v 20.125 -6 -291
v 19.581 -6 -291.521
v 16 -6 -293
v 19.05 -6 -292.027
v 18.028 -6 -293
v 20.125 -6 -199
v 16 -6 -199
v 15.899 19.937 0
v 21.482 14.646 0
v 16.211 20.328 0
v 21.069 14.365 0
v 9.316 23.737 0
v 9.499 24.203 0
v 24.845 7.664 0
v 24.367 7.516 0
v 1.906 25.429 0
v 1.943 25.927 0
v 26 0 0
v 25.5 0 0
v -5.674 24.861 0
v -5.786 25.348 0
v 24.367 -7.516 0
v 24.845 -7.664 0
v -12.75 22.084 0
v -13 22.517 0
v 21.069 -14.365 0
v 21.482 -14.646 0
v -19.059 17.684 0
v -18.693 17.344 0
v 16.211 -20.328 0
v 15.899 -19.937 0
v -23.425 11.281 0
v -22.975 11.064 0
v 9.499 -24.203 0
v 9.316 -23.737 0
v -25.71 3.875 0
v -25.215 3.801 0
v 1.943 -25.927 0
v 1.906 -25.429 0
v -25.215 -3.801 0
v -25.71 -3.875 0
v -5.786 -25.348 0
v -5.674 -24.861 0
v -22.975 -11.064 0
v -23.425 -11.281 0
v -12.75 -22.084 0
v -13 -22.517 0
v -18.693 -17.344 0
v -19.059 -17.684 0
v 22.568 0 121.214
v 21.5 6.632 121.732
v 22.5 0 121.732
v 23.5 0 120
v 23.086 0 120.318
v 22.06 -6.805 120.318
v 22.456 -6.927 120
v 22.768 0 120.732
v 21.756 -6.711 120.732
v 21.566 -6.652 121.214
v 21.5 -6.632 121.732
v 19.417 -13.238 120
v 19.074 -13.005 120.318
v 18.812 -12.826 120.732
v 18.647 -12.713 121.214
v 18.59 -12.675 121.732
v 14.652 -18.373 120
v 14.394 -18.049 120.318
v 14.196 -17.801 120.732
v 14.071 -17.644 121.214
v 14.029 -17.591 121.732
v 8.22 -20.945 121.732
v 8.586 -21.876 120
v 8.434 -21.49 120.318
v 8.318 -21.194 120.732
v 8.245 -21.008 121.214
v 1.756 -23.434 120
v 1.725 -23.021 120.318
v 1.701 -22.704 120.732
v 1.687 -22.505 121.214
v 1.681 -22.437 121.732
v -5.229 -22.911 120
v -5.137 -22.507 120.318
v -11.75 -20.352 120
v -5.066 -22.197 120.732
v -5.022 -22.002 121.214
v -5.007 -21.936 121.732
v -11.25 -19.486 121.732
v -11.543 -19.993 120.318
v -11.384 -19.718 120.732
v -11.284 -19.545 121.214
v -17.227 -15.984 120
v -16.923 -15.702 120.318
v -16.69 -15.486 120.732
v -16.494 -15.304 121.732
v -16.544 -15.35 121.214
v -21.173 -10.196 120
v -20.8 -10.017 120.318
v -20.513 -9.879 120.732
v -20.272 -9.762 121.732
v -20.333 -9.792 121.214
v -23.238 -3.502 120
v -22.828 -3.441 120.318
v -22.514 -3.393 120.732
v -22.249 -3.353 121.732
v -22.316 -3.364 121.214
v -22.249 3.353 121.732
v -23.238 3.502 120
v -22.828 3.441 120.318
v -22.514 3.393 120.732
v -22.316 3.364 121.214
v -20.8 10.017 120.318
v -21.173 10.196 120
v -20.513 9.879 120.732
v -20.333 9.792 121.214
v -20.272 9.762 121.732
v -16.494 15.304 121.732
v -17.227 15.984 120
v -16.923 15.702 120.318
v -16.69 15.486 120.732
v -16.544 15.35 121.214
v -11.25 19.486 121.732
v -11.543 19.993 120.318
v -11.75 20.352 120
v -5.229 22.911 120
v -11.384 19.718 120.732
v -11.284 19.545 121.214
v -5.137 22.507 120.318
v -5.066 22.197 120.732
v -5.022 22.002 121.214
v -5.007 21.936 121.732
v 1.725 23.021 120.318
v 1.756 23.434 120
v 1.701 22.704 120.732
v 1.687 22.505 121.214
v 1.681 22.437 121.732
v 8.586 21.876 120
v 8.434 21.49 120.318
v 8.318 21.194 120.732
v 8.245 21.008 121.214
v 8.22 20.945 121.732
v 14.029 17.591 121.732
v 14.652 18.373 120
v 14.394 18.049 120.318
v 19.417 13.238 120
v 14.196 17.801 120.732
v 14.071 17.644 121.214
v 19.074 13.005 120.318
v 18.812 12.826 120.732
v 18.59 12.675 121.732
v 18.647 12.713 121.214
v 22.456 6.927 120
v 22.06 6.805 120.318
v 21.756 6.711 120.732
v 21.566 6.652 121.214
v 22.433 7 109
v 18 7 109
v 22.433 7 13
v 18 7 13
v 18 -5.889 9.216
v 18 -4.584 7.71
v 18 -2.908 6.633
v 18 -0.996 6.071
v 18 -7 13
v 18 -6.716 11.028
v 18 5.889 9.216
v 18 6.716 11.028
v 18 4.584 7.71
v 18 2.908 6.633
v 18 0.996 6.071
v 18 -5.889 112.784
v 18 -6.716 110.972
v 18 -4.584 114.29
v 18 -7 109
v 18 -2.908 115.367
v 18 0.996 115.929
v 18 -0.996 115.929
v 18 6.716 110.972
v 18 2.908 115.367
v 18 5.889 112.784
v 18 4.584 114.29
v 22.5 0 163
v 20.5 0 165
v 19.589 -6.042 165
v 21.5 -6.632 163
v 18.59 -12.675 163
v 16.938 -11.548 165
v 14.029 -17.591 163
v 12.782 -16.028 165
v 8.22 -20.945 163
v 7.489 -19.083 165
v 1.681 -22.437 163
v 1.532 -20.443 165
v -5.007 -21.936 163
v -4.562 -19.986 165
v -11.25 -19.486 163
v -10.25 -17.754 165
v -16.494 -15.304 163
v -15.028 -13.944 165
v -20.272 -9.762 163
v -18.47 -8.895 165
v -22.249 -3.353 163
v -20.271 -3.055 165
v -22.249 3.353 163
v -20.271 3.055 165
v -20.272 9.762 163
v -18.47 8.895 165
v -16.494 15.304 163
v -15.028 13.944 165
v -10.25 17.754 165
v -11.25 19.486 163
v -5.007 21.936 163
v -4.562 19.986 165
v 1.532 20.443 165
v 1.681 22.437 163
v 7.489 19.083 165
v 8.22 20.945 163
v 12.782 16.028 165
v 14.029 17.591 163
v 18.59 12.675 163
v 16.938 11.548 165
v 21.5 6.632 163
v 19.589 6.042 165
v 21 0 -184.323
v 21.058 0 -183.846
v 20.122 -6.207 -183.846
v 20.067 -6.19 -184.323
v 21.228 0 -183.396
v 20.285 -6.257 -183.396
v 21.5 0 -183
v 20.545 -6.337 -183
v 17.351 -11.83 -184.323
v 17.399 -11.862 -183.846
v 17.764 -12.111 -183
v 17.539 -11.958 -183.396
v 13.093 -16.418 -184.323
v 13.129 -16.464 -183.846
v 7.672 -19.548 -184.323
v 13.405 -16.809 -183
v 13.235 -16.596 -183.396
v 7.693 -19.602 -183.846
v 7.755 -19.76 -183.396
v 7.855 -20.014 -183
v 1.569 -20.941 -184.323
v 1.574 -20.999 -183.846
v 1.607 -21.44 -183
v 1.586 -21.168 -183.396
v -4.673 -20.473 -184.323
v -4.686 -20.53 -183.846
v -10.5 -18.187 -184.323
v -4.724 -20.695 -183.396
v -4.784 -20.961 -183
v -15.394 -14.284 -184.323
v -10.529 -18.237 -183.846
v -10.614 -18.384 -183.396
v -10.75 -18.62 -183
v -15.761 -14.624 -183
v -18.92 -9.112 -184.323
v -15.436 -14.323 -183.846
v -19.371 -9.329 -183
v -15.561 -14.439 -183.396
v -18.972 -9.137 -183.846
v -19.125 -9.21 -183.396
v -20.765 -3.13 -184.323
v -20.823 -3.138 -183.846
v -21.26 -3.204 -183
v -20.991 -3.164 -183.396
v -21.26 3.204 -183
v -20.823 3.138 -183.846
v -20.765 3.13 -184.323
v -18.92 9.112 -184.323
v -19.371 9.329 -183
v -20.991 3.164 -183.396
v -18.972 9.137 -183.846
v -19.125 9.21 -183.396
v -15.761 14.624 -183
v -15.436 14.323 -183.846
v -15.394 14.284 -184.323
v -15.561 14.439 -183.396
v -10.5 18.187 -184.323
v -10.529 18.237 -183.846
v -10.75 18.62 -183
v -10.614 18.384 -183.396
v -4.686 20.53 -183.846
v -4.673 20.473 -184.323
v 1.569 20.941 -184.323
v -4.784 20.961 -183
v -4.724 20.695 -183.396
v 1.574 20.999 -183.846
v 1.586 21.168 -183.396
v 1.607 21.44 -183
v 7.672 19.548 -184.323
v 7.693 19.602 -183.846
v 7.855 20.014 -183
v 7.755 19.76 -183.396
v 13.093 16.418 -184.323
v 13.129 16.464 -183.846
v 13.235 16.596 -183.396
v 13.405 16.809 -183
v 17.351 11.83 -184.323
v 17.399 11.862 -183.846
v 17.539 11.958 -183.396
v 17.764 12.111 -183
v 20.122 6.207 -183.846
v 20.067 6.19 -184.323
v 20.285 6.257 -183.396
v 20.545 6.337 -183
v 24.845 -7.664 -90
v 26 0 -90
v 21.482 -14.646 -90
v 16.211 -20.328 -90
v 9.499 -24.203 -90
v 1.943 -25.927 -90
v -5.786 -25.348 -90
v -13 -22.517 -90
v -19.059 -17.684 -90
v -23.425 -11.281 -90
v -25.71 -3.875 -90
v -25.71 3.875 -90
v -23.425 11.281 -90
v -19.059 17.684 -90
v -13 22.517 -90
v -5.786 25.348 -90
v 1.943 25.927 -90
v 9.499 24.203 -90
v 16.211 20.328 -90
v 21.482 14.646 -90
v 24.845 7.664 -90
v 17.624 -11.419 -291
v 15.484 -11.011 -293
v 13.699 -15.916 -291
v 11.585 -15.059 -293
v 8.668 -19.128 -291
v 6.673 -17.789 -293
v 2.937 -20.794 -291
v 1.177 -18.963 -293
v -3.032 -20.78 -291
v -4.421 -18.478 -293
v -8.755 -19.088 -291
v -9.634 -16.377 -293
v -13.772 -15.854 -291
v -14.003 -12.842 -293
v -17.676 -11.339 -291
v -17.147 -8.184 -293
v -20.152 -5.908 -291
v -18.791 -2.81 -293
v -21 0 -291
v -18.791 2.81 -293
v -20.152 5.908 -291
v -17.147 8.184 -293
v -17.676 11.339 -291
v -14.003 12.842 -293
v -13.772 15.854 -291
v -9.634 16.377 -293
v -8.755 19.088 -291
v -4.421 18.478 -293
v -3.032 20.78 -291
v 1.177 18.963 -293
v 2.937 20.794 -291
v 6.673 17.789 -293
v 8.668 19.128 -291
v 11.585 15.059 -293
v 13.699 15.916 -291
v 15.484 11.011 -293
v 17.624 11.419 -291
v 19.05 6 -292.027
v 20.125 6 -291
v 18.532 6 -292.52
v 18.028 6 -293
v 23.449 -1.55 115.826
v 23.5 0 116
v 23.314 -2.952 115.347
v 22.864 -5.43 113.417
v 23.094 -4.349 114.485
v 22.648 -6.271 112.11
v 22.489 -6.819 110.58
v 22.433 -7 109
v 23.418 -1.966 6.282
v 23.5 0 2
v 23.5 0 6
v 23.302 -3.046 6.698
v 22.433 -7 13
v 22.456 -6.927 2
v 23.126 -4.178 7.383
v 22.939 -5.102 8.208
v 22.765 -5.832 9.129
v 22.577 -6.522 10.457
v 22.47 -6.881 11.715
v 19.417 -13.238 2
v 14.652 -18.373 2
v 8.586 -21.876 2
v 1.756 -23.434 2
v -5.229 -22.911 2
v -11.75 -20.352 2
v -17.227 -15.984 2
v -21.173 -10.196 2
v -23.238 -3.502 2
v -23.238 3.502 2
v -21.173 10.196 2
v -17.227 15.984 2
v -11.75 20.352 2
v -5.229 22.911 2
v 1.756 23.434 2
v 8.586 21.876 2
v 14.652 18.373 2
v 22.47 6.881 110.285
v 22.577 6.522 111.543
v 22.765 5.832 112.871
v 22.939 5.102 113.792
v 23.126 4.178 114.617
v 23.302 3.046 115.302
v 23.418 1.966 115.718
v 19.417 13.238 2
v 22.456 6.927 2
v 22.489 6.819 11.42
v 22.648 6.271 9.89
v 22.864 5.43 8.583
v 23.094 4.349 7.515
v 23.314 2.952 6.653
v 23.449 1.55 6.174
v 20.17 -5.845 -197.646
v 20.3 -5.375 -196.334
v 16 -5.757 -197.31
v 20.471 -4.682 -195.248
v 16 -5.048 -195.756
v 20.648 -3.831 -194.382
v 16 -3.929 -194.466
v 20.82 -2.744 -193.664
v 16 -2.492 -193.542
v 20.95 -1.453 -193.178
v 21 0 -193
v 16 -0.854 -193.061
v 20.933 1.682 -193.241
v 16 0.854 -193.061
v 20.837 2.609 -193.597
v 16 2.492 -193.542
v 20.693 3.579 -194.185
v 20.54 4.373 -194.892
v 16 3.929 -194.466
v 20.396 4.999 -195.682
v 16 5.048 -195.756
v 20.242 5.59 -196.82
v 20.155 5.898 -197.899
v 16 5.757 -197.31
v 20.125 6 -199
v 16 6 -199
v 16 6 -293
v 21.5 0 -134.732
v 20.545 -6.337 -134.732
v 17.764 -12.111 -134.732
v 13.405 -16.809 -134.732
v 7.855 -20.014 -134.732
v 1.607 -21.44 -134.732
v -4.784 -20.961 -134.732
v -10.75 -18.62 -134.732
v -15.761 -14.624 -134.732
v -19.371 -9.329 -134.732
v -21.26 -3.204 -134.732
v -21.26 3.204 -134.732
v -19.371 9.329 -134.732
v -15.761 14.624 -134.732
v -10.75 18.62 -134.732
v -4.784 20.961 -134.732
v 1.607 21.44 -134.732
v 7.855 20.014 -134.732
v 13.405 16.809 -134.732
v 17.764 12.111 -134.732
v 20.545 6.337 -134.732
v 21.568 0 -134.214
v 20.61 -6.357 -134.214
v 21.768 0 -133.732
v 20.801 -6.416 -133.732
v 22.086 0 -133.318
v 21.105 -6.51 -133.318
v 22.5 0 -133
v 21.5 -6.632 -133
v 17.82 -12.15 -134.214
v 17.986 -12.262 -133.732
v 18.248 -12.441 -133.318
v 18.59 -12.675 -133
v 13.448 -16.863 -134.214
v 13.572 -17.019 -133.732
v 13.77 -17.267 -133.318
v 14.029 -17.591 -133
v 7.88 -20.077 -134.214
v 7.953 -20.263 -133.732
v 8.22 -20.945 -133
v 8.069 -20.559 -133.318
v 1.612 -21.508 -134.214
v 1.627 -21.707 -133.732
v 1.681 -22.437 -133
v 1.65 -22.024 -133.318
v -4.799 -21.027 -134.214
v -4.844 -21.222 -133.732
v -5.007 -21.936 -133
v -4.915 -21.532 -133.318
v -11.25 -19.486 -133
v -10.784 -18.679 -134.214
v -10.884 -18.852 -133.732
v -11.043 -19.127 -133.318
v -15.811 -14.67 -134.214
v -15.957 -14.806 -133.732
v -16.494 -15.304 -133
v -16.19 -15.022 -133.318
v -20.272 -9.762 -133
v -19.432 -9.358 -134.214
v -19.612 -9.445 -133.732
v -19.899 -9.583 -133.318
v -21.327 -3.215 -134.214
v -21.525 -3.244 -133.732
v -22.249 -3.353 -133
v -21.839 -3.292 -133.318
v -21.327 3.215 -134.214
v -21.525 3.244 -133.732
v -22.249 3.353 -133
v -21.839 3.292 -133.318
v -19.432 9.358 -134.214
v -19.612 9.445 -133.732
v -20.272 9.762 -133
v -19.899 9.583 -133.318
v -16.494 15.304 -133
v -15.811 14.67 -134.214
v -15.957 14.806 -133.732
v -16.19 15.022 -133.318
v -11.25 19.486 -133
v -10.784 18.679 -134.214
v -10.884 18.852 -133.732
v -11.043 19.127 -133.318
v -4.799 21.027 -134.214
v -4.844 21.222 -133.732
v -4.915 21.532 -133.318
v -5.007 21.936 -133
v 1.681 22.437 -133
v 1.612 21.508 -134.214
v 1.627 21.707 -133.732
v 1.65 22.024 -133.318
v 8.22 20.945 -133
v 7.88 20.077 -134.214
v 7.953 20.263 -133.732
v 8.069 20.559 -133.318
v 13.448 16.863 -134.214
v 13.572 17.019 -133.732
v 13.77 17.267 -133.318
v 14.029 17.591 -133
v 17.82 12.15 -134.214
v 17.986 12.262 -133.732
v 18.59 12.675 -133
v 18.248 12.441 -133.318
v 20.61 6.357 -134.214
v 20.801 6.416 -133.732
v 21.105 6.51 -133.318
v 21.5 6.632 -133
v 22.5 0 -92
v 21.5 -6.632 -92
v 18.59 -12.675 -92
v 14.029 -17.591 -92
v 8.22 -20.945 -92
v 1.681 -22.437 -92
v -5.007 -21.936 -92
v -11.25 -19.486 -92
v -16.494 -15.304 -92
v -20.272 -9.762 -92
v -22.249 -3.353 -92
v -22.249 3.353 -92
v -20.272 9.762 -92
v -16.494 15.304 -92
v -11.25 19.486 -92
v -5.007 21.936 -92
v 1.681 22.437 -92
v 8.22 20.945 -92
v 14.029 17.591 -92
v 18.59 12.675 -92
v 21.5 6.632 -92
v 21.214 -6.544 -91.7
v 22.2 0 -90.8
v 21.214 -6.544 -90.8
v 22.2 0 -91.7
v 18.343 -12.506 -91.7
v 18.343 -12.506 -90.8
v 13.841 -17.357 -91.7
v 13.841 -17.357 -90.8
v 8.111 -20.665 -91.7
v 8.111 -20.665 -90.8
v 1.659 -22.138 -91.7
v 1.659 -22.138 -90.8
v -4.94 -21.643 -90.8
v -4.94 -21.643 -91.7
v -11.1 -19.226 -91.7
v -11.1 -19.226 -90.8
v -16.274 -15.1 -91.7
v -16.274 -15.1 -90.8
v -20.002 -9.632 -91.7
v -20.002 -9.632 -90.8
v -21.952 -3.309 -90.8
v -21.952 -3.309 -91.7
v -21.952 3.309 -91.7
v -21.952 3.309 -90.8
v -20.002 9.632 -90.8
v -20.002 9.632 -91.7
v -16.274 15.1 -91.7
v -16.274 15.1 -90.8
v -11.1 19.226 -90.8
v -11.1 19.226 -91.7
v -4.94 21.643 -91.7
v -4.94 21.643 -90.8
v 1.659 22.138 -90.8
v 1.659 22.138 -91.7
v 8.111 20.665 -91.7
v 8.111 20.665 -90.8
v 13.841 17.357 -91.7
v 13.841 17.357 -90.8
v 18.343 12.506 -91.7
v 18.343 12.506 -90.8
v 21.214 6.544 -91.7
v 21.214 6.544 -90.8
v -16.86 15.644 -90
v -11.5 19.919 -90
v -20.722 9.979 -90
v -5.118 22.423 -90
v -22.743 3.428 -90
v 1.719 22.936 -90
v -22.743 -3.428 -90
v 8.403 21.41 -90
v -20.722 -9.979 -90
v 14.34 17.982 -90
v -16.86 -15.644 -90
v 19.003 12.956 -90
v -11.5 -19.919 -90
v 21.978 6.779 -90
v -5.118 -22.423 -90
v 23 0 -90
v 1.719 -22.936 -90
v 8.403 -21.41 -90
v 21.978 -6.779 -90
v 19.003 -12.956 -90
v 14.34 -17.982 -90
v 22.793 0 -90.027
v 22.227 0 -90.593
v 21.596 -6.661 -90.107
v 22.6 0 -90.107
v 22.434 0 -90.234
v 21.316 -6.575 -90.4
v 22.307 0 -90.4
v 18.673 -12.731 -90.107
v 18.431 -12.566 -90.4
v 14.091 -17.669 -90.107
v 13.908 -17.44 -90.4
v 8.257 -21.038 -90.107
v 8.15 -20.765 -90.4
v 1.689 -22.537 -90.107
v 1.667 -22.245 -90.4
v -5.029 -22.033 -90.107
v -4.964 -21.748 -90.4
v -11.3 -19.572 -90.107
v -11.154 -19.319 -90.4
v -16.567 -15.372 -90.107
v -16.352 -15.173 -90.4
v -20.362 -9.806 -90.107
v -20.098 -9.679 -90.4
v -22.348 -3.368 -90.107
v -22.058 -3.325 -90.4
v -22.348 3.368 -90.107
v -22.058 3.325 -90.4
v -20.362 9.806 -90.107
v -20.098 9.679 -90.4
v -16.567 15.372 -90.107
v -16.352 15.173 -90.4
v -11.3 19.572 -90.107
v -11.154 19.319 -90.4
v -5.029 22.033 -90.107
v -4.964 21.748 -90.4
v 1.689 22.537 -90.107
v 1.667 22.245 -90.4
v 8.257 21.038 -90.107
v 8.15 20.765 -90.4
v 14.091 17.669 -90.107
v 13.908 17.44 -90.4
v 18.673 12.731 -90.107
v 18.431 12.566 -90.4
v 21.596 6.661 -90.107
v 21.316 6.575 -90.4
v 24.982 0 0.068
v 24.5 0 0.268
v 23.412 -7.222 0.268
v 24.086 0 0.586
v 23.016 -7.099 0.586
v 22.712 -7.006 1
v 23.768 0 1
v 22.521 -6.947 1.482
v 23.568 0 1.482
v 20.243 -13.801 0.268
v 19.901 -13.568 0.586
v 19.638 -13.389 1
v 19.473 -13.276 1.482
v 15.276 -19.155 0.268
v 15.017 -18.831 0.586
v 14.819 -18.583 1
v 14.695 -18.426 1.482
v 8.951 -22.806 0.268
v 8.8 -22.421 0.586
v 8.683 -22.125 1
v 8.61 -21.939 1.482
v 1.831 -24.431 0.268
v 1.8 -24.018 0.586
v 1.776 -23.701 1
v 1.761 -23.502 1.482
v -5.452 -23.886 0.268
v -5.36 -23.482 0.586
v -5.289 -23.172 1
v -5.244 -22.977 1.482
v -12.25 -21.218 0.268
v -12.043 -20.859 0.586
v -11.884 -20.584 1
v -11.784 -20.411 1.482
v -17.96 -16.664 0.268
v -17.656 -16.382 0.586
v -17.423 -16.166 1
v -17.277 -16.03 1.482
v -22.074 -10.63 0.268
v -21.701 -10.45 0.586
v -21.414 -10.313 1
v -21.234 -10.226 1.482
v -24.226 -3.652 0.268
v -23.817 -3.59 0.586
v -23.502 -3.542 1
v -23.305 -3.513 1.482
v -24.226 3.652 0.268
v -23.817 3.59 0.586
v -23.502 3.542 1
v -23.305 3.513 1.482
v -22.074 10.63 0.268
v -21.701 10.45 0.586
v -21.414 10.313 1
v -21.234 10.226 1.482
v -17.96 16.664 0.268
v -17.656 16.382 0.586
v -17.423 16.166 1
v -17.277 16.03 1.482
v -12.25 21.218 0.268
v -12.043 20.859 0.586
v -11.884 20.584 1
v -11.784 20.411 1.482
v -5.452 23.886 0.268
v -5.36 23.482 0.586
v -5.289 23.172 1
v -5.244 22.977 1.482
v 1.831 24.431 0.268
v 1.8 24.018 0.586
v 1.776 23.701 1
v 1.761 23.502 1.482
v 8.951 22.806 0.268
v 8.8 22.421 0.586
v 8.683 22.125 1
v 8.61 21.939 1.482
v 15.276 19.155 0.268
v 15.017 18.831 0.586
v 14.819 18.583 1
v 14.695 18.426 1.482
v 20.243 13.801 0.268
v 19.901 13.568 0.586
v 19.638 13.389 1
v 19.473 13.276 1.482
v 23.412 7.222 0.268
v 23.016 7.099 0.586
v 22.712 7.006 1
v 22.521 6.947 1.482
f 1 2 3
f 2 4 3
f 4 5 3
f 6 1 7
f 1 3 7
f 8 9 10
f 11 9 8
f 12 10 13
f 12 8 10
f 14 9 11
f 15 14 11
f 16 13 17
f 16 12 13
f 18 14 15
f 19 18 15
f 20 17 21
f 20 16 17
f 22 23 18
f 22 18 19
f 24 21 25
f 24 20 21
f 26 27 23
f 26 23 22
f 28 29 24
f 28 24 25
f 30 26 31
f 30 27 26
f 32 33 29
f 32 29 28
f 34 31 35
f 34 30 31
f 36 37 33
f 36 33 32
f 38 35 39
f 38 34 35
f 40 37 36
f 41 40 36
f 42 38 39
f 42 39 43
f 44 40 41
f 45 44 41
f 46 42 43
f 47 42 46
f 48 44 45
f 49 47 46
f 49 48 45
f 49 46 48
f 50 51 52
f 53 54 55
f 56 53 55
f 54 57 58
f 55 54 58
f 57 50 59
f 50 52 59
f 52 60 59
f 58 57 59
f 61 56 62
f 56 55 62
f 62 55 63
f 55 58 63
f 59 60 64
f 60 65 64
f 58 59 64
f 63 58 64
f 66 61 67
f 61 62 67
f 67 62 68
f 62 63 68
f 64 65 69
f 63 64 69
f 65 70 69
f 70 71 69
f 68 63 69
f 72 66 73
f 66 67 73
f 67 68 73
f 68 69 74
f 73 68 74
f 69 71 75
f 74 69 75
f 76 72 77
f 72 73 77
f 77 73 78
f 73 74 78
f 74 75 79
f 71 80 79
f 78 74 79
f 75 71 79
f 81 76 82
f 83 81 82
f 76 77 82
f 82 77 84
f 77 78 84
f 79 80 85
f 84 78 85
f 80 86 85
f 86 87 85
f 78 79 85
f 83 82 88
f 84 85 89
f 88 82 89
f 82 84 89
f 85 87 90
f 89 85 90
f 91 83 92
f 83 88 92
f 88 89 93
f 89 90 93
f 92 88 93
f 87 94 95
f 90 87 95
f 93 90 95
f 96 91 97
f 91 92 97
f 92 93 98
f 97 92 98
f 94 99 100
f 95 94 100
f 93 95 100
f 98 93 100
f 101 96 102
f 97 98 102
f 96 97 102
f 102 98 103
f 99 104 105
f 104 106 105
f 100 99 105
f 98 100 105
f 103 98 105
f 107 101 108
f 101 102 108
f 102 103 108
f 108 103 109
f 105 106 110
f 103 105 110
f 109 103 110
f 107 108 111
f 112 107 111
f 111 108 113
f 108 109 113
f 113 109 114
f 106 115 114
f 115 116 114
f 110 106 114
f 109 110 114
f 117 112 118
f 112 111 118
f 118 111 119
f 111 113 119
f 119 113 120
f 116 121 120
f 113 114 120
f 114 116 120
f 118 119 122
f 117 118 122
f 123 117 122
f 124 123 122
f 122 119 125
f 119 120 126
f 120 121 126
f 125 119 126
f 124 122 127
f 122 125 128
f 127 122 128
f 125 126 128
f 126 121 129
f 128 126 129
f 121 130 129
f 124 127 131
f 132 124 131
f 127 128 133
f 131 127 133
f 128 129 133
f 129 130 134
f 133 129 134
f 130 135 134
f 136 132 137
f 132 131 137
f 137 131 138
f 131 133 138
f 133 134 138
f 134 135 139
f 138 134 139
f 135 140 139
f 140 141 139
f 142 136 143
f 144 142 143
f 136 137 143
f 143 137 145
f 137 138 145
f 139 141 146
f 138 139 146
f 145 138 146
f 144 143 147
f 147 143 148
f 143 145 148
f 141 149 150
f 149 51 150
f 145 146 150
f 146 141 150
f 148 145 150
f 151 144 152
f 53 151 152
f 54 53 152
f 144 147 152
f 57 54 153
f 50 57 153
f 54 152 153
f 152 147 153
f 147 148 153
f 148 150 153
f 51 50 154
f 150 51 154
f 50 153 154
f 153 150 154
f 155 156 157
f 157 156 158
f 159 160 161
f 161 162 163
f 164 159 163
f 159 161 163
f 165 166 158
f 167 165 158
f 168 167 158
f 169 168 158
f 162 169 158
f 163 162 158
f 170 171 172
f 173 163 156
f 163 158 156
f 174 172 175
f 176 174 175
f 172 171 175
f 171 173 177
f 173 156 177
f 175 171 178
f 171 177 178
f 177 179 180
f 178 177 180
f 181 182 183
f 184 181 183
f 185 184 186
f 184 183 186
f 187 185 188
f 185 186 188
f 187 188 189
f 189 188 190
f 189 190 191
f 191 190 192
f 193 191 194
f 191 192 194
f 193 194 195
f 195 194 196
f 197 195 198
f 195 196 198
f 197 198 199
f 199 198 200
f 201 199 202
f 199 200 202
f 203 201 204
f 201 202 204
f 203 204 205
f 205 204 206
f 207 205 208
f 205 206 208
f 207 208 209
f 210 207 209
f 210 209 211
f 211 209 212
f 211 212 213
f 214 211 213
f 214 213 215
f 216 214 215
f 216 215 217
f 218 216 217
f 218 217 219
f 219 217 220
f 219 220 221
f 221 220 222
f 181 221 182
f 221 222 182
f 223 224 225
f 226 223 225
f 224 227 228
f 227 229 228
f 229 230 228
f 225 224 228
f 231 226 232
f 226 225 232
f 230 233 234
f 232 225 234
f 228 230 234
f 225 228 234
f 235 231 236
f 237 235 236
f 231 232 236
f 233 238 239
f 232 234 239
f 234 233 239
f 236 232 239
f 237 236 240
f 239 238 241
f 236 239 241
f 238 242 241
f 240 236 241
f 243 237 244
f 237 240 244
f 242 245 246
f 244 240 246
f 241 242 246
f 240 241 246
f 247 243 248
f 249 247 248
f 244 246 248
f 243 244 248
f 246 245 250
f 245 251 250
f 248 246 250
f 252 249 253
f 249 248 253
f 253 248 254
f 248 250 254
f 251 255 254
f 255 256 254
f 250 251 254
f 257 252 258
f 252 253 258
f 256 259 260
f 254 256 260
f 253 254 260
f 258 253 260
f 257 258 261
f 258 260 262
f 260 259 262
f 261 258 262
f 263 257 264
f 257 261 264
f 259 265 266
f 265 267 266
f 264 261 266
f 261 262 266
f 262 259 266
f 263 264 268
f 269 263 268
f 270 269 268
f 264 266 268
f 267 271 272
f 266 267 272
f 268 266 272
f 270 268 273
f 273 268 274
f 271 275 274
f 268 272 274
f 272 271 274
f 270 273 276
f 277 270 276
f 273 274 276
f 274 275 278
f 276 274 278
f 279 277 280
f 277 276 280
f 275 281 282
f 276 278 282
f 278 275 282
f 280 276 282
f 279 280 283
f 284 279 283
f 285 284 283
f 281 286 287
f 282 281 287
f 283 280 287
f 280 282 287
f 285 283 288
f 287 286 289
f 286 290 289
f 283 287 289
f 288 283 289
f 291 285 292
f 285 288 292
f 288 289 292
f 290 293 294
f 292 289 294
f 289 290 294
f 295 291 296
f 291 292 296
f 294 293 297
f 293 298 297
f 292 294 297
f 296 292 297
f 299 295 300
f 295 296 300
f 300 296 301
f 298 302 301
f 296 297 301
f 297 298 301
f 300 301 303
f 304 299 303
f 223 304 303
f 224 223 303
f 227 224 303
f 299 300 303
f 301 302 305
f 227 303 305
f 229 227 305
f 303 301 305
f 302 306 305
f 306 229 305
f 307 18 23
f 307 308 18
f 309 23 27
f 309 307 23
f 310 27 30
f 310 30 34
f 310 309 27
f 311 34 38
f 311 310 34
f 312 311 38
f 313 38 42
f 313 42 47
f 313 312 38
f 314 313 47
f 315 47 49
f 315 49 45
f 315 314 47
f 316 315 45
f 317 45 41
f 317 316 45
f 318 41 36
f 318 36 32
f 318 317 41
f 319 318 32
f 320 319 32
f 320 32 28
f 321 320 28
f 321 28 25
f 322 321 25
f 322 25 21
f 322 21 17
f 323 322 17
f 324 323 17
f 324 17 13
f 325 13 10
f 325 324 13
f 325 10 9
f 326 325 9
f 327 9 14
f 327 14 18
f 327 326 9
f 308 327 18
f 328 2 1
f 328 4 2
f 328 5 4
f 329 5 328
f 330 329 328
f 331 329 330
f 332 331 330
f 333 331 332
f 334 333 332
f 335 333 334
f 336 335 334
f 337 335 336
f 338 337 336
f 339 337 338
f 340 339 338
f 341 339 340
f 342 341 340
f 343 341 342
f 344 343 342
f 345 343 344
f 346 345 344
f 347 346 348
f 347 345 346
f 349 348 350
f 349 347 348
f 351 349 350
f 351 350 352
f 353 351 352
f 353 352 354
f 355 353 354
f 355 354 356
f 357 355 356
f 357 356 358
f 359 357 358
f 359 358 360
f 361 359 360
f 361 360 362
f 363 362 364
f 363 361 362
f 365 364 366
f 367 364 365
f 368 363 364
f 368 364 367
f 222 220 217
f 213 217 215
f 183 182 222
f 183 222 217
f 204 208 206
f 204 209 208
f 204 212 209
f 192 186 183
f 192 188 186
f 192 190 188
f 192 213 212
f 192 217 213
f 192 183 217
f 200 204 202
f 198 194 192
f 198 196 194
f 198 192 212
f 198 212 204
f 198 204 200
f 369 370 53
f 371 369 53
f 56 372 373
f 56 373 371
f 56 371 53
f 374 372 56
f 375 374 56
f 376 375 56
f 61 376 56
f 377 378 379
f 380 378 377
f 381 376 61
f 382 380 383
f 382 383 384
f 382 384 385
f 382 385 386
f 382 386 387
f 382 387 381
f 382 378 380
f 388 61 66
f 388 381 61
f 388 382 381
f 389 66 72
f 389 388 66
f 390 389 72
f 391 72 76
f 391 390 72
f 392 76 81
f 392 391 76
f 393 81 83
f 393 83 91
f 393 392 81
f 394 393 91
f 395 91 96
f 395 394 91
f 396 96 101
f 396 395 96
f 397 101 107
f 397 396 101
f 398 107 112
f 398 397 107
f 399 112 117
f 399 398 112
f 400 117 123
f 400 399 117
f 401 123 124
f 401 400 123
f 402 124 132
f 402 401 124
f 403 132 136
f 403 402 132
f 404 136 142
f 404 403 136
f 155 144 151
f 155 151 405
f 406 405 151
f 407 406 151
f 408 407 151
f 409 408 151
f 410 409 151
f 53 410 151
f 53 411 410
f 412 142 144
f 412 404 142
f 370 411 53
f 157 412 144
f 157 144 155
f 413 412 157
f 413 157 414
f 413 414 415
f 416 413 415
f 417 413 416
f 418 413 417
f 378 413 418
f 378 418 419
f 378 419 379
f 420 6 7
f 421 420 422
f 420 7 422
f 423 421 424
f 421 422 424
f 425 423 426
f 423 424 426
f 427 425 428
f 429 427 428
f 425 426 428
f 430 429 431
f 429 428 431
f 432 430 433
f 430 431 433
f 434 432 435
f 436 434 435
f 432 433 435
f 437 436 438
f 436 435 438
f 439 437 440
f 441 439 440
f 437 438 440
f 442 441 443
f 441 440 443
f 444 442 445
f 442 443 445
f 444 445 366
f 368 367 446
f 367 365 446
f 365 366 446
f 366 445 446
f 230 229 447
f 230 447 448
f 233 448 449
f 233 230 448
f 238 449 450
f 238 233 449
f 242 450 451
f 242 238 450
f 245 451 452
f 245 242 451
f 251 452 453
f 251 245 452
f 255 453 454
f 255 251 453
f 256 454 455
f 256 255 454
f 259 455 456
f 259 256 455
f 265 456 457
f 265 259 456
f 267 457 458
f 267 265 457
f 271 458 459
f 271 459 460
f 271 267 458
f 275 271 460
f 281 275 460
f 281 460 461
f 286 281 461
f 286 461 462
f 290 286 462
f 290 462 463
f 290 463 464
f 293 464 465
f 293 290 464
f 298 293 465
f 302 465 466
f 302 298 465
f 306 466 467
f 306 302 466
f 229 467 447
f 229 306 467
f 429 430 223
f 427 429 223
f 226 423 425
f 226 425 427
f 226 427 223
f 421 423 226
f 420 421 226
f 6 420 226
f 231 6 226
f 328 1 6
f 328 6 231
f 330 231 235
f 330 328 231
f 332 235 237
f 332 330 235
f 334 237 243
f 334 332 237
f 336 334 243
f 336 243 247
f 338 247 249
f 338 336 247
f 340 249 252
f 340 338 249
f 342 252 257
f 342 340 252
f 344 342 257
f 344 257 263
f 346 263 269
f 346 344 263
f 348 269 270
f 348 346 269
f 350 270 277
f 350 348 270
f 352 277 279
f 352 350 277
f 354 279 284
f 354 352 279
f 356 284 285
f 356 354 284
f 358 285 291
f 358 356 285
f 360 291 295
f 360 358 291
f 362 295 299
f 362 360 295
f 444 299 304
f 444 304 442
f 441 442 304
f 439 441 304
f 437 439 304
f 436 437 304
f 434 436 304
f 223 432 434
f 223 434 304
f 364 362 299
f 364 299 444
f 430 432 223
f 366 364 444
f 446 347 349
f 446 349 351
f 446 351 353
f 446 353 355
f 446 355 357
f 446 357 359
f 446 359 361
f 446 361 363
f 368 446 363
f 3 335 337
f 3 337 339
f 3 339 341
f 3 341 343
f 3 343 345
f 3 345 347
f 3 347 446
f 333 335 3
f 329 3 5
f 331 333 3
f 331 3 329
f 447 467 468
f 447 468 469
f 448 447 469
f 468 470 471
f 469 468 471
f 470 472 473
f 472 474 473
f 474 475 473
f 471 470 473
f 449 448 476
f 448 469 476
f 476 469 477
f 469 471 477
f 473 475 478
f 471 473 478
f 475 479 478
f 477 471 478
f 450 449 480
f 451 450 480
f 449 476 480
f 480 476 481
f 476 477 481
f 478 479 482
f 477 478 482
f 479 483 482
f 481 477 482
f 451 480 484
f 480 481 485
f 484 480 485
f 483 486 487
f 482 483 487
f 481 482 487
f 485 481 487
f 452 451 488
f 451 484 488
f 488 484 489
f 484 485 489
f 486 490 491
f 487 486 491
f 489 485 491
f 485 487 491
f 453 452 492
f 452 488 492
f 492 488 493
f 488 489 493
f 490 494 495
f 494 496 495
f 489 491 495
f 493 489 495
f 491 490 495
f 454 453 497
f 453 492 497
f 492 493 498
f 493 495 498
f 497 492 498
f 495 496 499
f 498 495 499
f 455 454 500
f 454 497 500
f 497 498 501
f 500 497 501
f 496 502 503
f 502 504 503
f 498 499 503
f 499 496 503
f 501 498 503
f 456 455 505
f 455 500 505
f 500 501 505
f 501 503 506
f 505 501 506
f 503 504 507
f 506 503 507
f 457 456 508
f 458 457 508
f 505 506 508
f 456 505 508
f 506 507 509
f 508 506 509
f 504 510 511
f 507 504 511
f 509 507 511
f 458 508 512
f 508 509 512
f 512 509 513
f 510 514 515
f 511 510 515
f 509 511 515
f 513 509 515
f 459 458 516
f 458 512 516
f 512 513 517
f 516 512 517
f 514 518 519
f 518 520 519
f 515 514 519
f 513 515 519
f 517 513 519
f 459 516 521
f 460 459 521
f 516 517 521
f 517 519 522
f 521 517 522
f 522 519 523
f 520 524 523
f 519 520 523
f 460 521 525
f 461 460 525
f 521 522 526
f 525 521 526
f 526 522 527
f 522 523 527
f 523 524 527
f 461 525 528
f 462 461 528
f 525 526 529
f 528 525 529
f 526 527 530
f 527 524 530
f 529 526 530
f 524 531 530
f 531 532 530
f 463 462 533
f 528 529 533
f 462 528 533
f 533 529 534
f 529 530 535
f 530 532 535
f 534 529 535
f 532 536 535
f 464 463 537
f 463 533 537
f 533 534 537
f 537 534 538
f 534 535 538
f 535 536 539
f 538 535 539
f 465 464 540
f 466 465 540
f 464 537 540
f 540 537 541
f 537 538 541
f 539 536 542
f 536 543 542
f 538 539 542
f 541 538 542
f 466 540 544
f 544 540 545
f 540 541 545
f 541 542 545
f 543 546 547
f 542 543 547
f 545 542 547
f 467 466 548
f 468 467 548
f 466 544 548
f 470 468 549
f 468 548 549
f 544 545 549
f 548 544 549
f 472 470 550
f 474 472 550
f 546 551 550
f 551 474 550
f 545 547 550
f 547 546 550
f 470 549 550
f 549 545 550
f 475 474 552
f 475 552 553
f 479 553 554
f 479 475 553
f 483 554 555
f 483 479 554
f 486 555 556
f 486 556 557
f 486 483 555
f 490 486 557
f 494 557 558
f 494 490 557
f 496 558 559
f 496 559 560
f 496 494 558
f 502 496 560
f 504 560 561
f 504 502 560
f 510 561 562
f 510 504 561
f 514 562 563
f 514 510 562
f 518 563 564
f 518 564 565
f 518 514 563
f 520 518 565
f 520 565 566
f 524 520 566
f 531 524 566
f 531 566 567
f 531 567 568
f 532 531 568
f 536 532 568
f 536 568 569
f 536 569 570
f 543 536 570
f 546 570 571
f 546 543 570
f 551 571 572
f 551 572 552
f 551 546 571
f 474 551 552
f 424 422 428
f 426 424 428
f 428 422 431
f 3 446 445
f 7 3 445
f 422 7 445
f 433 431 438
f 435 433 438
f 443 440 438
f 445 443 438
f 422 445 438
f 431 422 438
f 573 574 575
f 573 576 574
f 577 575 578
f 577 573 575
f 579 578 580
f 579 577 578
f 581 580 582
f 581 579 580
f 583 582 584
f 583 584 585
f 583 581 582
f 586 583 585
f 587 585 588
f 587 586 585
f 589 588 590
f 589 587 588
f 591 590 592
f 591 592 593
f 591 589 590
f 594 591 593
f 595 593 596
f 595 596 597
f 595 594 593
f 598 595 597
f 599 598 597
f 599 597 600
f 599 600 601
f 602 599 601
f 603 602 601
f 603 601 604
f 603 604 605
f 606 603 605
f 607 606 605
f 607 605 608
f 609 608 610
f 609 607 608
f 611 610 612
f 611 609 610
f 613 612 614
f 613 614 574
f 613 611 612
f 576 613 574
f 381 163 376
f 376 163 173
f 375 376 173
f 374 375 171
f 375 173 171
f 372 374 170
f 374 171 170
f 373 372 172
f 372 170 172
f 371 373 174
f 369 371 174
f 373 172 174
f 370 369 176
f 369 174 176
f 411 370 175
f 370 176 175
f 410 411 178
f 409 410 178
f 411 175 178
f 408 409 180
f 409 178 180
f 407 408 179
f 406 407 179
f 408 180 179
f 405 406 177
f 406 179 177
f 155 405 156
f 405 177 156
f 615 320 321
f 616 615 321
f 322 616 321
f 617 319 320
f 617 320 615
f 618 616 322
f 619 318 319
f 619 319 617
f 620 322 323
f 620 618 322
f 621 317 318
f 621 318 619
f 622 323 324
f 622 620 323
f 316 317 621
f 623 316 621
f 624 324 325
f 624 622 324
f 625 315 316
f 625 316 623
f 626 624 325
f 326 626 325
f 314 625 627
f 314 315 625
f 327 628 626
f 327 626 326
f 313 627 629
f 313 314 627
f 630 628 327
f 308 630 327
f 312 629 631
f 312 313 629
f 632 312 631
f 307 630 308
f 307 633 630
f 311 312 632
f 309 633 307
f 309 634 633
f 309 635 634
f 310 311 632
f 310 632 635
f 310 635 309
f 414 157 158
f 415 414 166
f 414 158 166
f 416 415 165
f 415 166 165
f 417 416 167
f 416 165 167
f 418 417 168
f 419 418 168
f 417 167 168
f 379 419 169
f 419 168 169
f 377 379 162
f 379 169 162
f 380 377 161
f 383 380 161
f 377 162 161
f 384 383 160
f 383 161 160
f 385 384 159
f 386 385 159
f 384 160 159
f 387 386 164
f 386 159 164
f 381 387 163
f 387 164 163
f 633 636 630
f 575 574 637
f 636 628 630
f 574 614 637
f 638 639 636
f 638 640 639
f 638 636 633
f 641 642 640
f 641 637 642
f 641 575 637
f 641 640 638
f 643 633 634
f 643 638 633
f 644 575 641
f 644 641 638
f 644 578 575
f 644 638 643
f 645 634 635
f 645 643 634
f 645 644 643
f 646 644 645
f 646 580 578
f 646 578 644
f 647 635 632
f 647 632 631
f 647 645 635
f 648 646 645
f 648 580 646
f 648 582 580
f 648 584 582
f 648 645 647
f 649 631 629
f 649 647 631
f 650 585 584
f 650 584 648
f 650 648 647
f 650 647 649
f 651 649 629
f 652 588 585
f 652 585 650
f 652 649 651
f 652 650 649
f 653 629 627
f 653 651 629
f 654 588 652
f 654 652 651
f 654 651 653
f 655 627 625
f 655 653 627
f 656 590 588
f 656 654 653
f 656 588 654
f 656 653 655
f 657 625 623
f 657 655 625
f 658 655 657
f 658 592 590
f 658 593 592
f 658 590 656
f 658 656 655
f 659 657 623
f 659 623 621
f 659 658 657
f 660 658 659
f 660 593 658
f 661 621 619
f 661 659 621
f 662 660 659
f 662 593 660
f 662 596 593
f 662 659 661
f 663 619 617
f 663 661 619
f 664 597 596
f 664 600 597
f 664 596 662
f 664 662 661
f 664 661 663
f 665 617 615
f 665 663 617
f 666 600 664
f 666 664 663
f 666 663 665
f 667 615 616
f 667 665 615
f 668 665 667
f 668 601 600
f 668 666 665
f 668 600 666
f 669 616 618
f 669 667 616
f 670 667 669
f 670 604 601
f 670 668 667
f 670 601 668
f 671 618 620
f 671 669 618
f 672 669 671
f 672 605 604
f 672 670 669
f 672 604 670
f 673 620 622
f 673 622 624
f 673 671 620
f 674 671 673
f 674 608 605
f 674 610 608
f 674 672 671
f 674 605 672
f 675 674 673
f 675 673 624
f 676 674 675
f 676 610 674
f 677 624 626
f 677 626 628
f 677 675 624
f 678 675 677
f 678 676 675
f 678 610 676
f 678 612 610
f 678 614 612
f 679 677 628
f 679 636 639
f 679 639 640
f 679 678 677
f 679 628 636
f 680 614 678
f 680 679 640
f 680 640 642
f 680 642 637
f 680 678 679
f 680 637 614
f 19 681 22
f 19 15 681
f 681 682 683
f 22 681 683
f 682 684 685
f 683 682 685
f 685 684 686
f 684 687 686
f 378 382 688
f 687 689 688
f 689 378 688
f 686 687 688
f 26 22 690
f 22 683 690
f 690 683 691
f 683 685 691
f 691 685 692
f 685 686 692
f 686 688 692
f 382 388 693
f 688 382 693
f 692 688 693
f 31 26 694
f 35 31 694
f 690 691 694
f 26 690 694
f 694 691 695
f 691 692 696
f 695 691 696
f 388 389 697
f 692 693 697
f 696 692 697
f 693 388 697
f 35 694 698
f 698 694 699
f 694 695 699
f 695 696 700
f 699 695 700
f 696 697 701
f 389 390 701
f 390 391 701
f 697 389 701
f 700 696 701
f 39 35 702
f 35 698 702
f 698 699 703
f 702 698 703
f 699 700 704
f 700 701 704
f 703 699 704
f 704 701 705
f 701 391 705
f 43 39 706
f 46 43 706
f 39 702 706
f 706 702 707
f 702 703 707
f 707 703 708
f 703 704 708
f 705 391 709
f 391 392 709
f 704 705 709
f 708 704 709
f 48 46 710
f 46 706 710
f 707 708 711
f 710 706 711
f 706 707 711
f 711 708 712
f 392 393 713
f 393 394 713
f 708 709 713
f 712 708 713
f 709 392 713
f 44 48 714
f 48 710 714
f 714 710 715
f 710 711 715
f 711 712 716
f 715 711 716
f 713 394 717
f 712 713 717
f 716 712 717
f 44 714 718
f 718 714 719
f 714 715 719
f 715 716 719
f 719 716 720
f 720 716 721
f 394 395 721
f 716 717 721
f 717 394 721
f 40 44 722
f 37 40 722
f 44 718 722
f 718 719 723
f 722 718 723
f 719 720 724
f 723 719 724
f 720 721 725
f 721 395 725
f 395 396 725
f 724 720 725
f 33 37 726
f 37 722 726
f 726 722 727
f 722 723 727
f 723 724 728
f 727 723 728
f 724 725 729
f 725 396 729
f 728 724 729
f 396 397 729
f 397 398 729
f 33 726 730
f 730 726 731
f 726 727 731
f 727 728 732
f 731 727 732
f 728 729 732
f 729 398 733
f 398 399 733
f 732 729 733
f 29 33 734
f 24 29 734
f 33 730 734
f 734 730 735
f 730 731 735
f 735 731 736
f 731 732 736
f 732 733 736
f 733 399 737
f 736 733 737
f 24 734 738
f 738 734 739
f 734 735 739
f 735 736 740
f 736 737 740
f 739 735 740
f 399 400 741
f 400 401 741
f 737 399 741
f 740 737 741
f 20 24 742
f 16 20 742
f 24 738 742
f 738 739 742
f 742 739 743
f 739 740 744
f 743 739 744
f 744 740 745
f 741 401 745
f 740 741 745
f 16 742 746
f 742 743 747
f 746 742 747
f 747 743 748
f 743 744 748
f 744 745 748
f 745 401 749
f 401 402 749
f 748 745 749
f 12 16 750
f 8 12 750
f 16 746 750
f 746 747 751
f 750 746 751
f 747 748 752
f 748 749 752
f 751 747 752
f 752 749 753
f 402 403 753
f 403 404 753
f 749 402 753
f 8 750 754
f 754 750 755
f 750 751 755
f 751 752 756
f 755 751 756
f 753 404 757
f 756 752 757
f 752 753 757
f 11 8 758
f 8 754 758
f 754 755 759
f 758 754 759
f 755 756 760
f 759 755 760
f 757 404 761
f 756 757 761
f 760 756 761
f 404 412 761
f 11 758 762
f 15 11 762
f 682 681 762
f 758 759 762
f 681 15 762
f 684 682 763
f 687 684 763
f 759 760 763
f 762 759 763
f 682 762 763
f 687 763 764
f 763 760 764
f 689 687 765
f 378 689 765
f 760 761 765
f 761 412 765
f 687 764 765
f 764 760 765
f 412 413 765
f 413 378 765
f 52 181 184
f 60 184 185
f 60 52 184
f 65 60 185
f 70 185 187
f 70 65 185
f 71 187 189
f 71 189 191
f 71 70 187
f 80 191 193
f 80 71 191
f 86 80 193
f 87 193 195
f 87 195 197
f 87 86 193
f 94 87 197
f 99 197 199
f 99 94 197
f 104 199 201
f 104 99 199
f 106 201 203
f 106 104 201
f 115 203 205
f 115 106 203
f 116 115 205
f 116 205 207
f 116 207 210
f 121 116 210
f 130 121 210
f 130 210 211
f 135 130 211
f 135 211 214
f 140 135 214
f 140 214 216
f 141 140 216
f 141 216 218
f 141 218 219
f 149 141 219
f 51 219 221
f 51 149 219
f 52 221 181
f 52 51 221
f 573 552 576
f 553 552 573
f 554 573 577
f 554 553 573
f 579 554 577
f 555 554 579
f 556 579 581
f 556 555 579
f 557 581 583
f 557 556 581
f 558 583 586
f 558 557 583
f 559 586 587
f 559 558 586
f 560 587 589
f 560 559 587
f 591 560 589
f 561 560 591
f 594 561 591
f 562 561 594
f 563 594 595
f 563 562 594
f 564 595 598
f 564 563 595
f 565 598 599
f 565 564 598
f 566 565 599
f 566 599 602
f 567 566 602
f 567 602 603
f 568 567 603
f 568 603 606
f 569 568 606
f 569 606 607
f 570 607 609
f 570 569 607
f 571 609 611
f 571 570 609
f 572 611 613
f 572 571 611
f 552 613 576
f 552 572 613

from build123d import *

# Parameters (mm, degrees)
FILLET_1_R          = 2
CHAMFER_1_SIZE      = 2
CUT_EXTRUDE_1_DEPTH = 43
CUT_EXTRUDE_2_DEPTH = 47


with BuildPart() as part:
    # 草图1 → 旋转1 (revolve)
    with BuildSketch(Plane(origin=(0, 0, 0), x_dir=(0, 0, -1), z_dir=(1, 0, 0)), mode=Mode.PRIVATE) as revolve_1_sk:
        with BuildLine():
            Line((-165, 0), (-165, -22.5))
            Line((-165, -22.5), (-120, -22.5))
            Line((-120, -22.5), (-120, -23.5))
            Line((-120, -23.5), (0, -23.5))
            Line((0, -23.5), (0, -26))
            Line((0, -26), (90, -26))
            Line((90, -26), (90, -23))
            ThreePointArc((90, -23), (90.234314575, -22.434314575), (90.8, -22.2))
            Line((90.8, -22.2), (91.7, -22.2))
            Line((91.7, -22.2), (92, -22.5))
            Line((92, -22.5), (133, -22.5))
            Line((133, -22.5), (133, -21.5))
            Line((133, -21.5), (183, -21.5))
            Line((183, -21.5), (183, -21))
            Line((183, -21), (293, -21))
            Line((293, -21), (293, 0))
            Line((293, 0), (-165, 0))
        make_face()
    revolve(revolve_1_sk.sketch.rotate(Axis((0, 0, 440.995541918), (0, 0, -1)), 270), axis=Axis((0, 0, 440.995541918), (0, 0, -1)))

    # 圆角1
    # the kernel refuses this fillet: 2 mm, written as the material it adds along each edge
    with BuildSketch(Plane(origin=(0, 0, 120), x_dir=(1, 0, 0), z_dir=(0, 1, 0))) as fillet_1_piece_1:
        with BuildLine():
            CenterArc((24.5, -1.732050808), FILLET_1_R, 120, 60)
            Line((23.5, 0), (23.48, 0.034641016))
            ThreePointArc((23.48, 0.034641016), (23, 0.04), (22.5, 0.04))
            Line((22.5, 0.04), (22.46, 0))
            Line((22.46, 0), (22.46, -1.732050808))
            Line((22.46, -1.732050808), (22.5, -1.732050808))
        make_face()
    revolve(axis=Axis((0, 0, 120), (0, 0, -1)))
    with BuildSketch(Plane(origin=(0, 0, 0), x_dir=(1, 0, 0), z_dir=(0, 1, 0))) as fillet_1_piece_2:
        with BuildLine():
            CenterArc((23.5 + FILLET_1_R, -FILLET_1_R), FILLET_1_R, 90, 90)
            Line((23.5 + FILLET_1_R, 0), (23.5 + FILLET_1_R, FILLET_1_R * 0.02))
            Line((23.5 + FILLET_1_R, FILLET_1_R * 0.02), (23.5 - FILLET_1_R * 0.02, FILLET_1_R * 0.02))
            Line((23.5 - FILLET_1_R * 0.02, FILLET_1_R * 0.02), (23.5 - FILLET_1_R * 0.02, -FILLET_1_R))
            Line((23.5 - FILLET_1_R * 0.02, -FILLET_1_R), (23.5, -FILLET_1_R))
        make_face()
    revolve(axis=Axis((0, 0, 0), (0, 0, -1)))
    with BuildSketch(Plane(origin=(0, 0, -133), x_dir=(1, 0, 0), z_dir=(0, 1, 0))) as fillet_1_piece_3:
        with BuildLine():
            CenterArc((23.5, 1.732050808), FILLET_1_R, 180, 60)
            Line((21.5, 1.732050808), (21.46, 1.732050808))
            Line((21.46, 1.732050808), (21.46, 0))
            Line((21.46, 0), (21.5, -0.04))
            ThreePointArc((21.5, -0.04), (22, -0.04), (22.48, -0.034641016))
            Line((22.48, -0.034641016), (22.5, 0))
        make_face()
    revolve(axis=Axis((0, 0, -133), (0, 0, -1)))
    with BuildSketch(Plane(origin=(0, 0, -183), x_dir=(1, 0, 0), z_dir=(0, 1, 0))) as fillet_1_piece_4:
        with BuildLine():
            CenterArc((23, 1.322875656), FILLET_1_R, 180, 41.409622109)
            Line((21, 1.322875656), (20.96, 1.322875656))
            Line((20.96, 1.322875656), (20.96, 0))
            Line((20.96, 0), (21, -0.04))
            ThreePointArc((21, -0.04), (21.25, -0.04), (21.47, -0.026457513))
            Line((21.47, -0.026457513), (21.5, 0))
        make_face()
    revolve(axis=Axis((0, 0, -183), (0, 0, -1)))

    # 倒角1
    chamfer_1_edges = [part.edges().sort_by_distance(p)[0] for p in [
        (-22.5, 0, 165),
        (-21, 0, -293),
    ]]
    chamfer(chamfer_1_edges, length=CHAMFER_1_SIZE)

    # 草图3 → 切除-拉伸1 (cut)
    with BuildSketch(Plane(origin=(18, 0, 0), x_dir=(0, 0, -1), z_dir=(1, 0, 0))):
        with BuildLine():
            Line((-109, 7), (-13, 7))
            ThreePointArc((-13, 7), (-6, 0), (-13, -7))
            Line((-13, -7), (-109, -7))
            ThreePointArc((-109, -7), (-116, 0), (-109, 7))
        make_face()
    extrude(amount=CUT_EXTRUDE_1_DEPTH, mode=Mode.SUBTRACT)

    # 草图4 → 切除-拉伸2 (cut)
    with BuildSketch(Plane(origin=(16, 0, 0), x_dir=(0, 0, -1), z_dir=(1, 0, 0))):
        with BuildLine():
            Line((199, 6), (293, 6))
            Line((293, 6), (293, -6))
            Line((293, -6), (199, -6))
            ThreePointArc((199, -6), (193, 0), (199, 6))
        make_face()
    extrude(amount=CUT_EXTRUDE_2_DEPTH, mode=Mode.SUBTRACT)


solid = part.part
